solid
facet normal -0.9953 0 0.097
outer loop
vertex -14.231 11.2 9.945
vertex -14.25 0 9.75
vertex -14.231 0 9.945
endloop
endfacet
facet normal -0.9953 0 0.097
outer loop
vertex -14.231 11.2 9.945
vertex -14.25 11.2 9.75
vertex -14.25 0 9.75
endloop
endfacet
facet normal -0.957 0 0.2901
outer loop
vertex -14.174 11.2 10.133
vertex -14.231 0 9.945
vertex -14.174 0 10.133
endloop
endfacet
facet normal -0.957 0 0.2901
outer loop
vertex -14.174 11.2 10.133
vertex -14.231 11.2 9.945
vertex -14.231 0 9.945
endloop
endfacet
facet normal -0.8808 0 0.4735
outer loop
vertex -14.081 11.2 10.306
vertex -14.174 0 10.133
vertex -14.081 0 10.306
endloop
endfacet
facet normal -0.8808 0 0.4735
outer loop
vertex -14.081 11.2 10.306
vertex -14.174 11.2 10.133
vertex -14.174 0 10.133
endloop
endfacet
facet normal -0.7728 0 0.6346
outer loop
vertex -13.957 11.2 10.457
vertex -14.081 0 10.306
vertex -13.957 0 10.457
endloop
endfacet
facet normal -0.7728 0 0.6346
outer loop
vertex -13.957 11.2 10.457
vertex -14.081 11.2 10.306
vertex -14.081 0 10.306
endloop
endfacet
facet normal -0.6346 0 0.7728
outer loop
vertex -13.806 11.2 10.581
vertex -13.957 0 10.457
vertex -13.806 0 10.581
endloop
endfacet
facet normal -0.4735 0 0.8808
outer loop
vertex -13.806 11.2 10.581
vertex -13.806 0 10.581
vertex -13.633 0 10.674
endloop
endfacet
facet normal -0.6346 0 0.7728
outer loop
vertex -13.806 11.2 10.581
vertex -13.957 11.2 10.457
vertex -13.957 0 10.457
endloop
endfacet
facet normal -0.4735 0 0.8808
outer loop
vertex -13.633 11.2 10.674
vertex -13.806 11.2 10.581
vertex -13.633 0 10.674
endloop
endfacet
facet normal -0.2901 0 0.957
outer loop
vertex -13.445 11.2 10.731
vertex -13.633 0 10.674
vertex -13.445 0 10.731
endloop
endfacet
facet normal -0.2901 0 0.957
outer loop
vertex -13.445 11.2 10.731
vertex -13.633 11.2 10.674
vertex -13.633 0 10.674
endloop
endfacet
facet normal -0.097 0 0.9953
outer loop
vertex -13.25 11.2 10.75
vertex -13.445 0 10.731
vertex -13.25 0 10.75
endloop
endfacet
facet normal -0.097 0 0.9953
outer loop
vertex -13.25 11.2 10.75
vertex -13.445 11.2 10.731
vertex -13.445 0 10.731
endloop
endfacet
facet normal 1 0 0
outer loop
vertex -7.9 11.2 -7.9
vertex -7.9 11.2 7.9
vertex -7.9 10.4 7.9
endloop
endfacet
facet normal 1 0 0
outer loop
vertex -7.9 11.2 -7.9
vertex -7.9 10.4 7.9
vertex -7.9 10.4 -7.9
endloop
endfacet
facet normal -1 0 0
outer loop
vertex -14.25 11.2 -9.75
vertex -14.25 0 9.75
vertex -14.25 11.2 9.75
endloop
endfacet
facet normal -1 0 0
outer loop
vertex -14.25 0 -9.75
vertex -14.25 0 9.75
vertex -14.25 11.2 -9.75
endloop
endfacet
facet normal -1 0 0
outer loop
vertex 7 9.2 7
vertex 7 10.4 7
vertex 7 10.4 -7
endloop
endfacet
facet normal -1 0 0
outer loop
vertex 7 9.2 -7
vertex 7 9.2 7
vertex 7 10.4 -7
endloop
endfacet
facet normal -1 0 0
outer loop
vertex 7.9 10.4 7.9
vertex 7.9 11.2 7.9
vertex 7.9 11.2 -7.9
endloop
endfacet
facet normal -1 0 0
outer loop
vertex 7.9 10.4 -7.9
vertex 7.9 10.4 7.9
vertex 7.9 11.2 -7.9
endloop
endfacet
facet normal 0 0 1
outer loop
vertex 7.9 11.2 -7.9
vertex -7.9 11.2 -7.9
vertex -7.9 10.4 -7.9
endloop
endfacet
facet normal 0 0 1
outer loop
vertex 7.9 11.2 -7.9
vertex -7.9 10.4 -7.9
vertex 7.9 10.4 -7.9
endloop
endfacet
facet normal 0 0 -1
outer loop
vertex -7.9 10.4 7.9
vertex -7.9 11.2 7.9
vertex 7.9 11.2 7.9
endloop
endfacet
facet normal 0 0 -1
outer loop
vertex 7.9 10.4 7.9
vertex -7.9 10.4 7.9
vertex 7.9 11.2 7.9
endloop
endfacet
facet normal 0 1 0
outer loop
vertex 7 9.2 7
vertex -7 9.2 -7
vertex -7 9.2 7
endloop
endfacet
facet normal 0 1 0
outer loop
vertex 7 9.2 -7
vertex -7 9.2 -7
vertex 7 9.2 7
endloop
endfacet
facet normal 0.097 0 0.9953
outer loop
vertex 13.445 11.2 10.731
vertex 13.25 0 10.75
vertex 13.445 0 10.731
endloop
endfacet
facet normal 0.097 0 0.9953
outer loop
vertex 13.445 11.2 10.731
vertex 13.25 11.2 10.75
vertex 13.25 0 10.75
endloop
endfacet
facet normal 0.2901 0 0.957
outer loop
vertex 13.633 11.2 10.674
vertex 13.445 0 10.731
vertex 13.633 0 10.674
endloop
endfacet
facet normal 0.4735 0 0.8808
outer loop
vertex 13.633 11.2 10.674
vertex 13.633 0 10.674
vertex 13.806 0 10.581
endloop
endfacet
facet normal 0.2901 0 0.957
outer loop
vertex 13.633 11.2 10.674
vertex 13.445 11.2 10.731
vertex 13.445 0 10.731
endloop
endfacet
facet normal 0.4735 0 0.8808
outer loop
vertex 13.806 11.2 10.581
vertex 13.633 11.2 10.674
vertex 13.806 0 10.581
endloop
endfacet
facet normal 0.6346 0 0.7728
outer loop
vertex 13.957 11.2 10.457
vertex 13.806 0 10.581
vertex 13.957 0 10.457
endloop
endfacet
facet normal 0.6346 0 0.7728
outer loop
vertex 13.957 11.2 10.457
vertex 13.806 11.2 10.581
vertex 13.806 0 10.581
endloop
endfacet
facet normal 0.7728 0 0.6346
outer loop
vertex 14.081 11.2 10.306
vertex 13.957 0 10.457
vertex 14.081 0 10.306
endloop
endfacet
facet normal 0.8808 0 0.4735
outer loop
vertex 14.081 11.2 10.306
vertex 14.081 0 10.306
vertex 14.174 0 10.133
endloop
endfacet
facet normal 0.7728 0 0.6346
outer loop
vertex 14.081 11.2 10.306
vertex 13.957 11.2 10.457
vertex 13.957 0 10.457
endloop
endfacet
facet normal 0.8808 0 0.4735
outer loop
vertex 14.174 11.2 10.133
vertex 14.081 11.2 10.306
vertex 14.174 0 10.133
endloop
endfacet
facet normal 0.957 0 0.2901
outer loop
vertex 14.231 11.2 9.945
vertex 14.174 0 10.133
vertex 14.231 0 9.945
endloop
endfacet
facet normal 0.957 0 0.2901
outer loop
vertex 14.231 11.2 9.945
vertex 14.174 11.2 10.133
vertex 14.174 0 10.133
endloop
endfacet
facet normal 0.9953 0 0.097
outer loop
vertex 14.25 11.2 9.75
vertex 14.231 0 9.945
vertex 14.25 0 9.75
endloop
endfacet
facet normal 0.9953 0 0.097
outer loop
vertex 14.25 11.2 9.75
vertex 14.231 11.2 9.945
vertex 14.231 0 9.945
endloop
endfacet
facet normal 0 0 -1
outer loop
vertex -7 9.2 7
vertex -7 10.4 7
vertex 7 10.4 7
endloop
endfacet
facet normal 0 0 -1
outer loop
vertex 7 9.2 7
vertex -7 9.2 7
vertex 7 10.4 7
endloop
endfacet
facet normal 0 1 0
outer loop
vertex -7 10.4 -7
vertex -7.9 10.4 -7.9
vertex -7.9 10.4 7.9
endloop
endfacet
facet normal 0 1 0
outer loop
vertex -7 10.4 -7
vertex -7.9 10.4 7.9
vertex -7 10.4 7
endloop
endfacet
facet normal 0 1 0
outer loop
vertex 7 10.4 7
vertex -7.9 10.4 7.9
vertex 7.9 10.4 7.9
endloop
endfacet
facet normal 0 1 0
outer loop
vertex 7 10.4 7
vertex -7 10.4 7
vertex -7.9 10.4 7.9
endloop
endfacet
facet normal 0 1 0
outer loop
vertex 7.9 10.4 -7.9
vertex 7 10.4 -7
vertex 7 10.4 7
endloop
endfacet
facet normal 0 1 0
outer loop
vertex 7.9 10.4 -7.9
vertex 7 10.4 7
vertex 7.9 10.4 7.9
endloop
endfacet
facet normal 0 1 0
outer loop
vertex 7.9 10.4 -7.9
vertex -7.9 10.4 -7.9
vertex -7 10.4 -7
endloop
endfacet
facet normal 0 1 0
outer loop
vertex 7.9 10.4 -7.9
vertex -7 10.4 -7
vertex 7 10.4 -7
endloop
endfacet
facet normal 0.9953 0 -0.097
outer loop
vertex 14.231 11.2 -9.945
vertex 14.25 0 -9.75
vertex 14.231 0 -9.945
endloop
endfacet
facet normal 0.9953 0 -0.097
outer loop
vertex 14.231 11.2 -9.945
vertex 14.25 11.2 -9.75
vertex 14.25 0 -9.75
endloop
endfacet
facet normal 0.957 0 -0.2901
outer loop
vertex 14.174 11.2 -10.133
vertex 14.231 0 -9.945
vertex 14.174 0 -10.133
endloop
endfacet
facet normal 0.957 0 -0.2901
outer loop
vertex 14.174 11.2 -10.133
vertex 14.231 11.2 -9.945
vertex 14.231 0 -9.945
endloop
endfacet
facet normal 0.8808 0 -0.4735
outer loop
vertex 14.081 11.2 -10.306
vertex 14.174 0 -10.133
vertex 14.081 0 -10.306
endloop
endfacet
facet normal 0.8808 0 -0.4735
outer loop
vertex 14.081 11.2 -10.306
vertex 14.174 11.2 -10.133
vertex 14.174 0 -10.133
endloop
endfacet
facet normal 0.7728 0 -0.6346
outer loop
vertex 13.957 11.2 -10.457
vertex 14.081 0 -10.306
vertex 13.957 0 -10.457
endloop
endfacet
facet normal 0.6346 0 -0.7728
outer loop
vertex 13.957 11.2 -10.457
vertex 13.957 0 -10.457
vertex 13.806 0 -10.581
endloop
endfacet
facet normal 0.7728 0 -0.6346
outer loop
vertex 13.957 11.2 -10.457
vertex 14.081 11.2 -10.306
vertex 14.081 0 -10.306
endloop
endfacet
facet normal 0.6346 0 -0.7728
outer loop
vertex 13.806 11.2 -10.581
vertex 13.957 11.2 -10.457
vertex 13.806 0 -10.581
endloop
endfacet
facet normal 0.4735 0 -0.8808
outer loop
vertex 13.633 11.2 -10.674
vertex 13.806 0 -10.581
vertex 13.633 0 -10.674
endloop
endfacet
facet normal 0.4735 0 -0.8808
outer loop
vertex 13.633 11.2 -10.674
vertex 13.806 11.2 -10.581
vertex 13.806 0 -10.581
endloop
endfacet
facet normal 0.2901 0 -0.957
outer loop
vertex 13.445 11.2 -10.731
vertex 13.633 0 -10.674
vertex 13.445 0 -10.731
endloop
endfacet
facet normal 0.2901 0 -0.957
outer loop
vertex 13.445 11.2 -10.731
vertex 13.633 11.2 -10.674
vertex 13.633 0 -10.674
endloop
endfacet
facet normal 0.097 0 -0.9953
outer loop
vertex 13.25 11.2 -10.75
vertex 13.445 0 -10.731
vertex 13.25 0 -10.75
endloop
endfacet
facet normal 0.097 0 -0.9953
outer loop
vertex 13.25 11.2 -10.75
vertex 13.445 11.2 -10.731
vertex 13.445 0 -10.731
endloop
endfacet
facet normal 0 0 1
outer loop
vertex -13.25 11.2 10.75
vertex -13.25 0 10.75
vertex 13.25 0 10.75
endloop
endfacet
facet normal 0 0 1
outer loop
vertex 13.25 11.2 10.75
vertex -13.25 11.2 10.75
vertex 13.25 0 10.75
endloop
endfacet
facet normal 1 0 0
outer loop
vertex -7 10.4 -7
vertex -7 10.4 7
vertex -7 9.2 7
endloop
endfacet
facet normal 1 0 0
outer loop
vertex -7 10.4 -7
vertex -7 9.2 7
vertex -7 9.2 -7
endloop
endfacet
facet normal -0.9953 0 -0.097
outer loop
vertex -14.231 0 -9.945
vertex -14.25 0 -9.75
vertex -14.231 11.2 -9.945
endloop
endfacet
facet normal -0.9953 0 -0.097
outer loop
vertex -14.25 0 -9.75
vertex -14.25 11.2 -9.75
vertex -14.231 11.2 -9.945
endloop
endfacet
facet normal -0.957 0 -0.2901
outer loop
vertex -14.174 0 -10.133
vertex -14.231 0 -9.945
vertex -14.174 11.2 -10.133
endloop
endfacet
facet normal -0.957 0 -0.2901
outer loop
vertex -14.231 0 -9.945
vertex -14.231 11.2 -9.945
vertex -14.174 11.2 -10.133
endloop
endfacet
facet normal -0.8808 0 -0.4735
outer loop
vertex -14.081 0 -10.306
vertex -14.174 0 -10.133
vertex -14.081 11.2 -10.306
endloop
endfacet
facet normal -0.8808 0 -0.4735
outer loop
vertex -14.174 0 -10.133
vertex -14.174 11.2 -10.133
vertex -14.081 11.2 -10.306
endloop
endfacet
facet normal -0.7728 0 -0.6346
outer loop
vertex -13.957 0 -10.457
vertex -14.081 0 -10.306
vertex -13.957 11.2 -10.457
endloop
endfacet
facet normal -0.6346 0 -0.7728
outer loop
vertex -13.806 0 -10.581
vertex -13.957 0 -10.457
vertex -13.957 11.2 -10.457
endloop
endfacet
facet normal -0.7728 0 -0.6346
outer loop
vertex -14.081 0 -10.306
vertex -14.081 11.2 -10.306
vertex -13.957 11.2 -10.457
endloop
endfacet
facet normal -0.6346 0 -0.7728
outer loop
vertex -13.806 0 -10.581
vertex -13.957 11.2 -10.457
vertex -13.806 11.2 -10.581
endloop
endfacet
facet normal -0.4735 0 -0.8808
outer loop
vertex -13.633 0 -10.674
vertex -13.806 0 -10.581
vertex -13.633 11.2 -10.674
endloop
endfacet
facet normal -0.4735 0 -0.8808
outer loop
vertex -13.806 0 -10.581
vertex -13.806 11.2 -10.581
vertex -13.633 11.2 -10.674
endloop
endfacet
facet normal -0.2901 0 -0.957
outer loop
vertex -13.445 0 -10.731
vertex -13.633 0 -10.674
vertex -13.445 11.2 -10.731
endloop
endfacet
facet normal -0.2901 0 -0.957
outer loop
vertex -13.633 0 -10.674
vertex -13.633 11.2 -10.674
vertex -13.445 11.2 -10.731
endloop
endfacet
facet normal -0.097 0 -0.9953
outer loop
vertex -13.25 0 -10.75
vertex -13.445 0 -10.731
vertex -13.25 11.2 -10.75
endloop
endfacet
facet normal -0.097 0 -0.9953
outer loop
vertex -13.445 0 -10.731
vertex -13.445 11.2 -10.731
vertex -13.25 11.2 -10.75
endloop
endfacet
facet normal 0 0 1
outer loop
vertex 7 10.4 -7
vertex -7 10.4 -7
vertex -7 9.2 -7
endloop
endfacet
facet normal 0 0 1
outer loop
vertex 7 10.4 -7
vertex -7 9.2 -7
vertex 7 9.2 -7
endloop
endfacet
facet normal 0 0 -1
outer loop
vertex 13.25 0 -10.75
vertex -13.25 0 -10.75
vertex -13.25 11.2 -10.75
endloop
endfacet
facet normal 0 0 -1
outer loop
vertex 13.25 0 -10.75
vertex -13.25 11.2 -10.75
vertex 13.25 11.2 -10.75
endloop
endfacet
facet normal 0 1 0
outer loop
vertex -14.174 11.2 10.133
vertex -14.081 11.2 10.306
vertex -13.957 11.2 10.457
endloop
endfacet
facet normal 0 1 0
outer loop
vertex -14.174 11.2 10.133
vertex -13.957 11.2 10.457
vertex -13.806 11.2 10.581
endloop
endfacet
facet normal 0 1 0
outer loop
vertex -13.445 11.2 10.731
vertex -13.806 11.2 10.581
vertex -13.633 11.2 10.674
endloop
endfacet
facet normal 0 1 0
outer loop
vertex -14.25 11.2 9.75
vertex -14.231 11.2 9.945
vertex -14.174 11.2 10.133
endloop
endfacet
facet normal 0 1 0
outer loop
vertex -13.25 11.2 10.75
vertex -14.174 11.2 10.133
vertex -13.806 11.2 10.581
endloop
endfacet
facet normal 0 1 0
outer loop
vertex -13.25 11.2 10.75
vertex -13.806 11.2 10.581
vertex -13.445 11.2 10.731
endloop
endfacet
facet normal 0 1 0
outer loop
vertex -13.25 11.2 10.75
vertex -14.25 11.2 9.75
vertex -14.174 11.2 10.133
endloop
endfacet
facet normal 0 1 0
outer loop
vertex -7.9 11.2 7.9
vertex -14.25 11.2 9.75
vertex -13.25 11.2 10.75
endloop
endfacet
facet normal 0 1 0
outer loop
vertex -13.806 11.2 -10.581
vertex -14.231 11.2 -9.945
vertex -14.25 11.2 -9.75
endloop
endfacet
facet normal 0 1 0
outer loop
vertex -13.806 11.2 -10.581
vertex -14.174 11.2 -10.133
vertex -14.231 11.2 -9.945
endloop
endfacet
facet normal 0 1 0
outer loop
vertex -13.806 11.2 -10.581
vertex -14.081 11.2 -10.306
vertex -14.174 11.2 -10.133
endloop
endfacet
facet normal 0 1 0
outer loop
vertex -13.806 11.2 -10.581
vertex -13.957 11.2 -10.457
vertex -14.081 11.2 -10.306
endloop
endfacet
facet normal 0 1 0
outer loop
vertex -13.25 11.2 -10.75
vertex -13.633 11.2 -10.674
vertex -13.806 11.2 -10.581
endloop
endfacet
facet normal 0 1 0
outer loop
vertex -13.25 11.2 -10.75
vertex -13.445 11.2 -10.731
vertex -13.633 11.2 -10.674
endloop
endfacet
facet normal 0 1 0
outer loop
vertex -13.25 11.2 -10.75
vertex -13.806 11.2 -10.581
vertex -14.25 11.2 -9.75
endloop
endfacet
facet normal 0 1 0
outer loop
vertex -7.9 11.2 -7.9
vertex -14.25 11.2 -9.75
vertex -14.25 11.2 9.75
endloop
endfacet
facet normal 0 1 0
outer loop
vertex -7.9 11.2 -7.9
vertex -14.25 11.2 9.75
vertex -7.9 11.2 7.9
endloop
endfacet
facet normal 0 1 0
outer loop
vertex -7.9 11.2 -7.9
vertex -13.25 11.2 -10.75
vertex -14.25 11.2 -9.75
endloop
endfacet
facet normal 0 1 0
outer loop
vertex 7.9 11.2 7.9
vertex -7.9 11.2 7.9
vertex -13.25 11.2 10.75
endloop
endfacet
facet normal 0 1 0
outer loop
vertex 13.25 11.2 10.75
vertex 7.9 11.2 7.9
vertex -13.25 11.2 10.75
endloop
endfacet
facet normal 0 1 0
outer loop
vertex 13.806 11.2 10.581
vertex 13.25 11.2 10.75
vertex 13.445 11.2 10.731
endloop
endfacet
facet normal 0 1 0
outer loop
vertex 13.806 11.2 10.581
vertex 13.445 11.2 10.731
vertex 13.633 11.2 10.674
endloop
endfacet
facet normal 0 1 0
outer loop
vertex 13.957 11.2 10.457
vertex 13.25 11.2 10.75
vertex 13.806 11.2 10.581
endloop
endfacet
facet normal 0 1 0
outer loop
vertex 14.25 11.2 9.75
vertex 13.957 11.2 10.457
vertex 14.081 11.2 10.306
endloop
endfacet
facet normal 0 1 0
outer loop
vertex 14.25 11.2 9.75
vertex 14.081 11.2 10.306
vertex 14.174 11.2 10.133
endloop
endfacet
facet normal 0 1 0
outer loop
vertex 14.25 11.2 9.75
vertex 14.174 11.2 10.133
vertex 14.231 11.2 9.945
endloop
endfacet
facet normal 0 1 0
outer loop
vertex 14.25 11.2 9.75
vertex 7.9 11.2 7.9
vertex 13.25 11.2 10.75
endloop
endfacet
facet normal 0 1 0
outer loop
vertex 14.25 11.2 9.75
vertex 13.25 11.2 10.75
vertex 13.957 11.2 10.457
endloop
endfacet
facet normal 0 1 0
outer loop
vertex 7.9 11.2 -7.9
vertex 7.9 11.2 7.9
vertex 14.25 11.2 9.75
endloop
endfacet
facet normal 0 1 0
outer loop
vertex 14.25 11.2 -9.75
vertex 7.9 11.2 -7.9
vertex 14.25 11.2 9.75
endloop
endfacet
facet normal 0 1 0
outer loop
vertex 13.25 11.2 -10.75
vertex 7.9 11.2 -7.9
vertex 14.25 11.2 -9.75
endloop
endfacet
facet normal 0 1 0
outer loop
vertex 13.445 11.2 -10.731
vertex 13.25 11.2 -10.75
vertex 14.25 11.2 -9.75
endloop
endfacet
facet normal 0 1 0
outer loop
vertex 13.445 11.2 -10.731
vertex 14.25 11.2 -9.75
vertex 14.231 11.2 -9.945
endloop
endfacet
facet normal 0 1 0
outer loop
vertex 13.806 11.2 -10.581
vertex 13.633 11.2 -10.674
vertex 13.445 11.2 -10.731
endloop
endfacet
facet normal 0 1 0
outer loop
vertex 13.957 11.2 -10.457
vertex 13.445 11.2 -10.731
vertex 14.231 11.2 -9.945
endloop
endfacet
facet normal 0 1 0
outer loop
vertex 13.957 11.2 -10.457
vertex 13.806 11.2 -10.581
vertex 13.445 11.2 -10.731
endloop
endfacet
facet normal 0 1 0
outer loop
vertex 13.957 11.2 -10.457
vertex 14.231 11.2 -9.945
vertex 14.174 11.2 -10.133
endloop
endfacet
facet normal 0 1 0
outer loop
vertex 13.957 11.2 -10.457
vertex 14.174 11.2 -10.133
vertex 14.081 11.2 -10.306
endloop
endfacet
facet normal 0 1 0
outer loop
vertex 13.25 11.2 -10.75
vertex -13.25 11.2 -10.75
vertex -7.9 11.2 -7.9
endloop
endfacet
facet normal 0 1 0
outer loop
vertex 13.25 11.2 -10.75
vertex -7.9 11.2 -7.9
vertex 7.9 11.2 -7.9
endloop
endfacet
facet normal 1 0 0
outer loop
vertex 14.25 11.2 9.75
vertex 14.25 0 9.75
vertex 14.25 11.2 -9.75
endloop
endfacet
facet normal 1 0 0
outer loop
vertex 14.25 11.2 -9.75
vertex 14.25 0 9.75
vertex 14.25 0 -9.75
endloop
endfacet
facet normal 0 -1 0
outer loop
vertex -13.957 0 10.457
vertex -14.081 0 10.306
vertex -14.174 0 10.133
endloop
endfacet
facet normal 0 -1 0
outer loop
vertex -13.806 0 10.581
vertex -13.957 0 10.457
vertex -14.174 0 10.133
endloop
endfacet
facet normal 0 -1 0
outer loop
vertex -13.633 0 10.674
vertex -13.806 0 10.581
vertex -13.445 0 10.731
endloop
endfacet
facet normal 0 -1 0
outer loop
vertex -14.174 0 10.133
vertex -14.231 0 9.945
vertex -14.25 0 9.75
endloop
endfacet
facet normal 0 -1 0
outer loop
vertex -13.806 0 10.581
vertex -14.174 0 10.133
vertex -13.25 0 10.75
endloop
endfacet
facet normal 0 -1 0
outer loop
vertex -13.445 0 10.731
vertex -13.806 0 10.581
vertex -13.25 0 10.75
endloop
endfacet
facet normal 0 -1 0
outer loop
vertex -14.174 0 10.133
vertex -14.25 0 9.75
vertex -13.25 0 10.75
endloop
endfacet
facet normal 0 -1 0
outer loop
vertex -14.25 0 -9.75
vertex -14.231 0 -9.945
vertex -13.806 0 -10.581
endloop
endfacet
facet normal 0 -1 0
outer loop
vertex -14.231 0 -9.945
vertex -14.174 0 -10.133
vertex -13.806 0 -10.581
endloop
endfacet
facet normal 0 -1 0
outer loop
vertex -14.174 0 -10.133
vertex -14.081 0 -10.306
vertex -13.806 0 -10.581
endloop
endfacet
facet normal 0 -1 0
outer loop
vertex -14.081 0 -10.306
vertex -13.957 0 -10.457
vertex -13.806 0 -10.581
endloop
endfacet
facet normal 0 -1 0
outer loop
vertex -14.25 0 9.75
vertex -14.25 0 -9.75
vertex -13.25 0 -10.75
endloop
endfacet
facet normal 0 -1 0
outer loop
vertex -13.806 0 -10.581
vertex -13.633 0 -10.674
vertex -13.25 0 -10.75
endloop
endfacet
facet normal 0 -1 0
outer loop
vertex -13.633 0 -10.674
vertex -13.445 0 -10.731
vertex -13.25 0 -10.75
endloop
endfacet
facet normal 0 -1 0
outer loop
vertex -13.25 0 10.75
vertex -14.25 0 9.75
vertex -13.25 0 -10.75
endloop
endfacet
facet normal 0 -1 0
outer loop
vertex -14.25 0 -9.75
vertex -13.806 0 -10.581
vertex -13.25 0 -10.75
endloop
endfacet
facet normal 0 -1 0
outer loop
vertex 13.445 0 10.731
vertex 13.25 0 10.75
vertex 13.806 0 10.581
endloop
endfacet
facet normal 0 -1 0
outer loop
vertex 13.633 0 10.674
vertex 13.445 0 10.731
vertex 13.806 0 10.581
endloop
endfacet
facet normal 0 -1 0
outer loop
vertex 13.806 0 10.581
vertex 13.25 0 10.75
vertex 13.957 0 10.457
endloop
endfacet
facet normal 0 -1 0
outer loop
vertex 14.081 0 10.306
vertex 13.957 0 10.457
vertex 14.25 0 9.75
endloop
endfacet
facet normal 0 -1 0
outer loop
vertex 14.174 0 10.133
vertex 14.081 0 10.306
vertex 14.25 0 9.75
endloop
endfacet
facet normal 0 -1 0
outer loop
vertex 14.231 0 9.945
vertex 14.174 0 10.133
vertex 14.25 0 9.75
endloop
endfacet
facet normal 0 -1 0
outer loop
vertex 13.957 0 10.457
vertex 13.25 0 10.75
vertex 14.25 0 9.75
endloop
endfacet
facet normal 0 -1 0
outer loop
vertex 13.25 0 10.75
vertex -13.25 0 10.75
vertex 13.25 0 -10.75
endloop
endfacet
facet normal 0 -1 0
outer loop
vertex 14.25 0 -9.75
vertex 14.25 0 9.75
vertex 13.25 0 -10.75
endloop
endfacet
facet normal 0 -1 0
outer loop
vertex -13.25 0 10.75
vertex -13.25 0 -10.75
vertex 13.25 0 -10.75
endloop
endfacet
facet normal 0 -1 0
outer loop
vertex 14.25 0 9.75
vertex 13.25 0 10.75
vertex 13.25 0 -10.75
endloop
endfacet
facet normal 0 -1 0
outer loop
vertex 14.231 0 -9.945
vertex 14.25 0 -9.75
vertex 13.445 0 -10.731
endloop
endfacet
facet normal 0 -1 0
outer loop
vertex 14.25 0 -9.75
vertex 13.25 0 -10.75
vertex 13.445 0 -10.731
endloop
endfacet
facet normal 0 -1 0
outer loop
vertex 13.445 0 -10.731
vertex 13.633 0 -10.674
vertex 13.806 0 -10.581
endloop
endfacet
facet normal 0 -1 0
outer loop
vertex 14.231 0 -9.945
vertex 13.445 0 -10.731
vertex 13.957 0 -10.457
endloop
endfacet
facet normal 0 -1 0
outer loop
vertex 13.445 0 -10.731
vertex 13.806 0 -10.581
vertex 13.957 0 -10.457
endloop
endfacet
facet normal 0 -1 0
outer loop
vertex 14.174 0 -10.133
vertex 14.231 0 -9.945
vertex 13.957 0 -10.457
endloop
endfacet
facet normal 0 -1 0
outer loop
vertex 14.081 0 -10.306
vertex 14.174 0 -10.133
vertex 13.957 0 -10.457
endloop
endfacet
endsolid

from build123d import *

# Parameters (mm, degrees)
SKETCH_1_W          = 28.5
SKETCH_1_H          = 21.5
EXTRUDE_1_DEPTH     = 11.2
FILLET_1_R          = 1
SKETCH_3_W          = 14
SKETCH_3_H          = 14
CUT_EXTRUDE_2_DEPTH = 2
SKETCH_4_W          = 15.8
SKETCH_4_H          = 15.8
CUT_EXTRUDE_3_DEPTH = 0.8


with BuildPart() as part:
    # 草图1 → 凸台-拉伸1 (new body)
    with BuildSketch(Plane(origin=(0, 0, 0), x_dir=(1, 0, 0), z_dir=(0, 1, 0))):
        Rectangle(SKETCH_1_W, SKETCH_1_H)
    extrude(amount=EXTRUDE_1_DEPTH)

    # 圆角1
    fillet_1_edges = [part.edges().sort_by_distance(p)[0] for p in [
        (14.25, 5.6, 10.75),
        (-14.25, 5.6, 10.75),
        (-14.25, 5.6, -10.75),
        (14.25, 5.6, -10.75),
    ]]
    fillet(fillet_1_edges, radius=FILLET_1_R)

    # 草图3 → 切除-拉伸2 (cut)
    with BuildSketch(Plane(origin=(0, 11.2, 0), x_dir=(1, 0, 0), z_dir=(0, 1, 0))):
        Rectangle(SKETCH_3_W, SKETCH_3_H)
    extrude(amount=-CUT_EXTRUDE_2_DEPTH, mode=Mode.SUBTRACT)

    # 草图4 → 切除-拉伸3 (cut)
    with BuildSketch(Plane(origin=(0, 11.2, 0), x_dir=(1, 0, 0), z_dir=(0, 1, 0))):
        Rectangle(SKETCH_4_W, SKETCH_4_H)
    extrude(amount=-CUT_EXTRUDE_3_DEPTH, mode=Mode.SUBTRACT)


solid = part.part
